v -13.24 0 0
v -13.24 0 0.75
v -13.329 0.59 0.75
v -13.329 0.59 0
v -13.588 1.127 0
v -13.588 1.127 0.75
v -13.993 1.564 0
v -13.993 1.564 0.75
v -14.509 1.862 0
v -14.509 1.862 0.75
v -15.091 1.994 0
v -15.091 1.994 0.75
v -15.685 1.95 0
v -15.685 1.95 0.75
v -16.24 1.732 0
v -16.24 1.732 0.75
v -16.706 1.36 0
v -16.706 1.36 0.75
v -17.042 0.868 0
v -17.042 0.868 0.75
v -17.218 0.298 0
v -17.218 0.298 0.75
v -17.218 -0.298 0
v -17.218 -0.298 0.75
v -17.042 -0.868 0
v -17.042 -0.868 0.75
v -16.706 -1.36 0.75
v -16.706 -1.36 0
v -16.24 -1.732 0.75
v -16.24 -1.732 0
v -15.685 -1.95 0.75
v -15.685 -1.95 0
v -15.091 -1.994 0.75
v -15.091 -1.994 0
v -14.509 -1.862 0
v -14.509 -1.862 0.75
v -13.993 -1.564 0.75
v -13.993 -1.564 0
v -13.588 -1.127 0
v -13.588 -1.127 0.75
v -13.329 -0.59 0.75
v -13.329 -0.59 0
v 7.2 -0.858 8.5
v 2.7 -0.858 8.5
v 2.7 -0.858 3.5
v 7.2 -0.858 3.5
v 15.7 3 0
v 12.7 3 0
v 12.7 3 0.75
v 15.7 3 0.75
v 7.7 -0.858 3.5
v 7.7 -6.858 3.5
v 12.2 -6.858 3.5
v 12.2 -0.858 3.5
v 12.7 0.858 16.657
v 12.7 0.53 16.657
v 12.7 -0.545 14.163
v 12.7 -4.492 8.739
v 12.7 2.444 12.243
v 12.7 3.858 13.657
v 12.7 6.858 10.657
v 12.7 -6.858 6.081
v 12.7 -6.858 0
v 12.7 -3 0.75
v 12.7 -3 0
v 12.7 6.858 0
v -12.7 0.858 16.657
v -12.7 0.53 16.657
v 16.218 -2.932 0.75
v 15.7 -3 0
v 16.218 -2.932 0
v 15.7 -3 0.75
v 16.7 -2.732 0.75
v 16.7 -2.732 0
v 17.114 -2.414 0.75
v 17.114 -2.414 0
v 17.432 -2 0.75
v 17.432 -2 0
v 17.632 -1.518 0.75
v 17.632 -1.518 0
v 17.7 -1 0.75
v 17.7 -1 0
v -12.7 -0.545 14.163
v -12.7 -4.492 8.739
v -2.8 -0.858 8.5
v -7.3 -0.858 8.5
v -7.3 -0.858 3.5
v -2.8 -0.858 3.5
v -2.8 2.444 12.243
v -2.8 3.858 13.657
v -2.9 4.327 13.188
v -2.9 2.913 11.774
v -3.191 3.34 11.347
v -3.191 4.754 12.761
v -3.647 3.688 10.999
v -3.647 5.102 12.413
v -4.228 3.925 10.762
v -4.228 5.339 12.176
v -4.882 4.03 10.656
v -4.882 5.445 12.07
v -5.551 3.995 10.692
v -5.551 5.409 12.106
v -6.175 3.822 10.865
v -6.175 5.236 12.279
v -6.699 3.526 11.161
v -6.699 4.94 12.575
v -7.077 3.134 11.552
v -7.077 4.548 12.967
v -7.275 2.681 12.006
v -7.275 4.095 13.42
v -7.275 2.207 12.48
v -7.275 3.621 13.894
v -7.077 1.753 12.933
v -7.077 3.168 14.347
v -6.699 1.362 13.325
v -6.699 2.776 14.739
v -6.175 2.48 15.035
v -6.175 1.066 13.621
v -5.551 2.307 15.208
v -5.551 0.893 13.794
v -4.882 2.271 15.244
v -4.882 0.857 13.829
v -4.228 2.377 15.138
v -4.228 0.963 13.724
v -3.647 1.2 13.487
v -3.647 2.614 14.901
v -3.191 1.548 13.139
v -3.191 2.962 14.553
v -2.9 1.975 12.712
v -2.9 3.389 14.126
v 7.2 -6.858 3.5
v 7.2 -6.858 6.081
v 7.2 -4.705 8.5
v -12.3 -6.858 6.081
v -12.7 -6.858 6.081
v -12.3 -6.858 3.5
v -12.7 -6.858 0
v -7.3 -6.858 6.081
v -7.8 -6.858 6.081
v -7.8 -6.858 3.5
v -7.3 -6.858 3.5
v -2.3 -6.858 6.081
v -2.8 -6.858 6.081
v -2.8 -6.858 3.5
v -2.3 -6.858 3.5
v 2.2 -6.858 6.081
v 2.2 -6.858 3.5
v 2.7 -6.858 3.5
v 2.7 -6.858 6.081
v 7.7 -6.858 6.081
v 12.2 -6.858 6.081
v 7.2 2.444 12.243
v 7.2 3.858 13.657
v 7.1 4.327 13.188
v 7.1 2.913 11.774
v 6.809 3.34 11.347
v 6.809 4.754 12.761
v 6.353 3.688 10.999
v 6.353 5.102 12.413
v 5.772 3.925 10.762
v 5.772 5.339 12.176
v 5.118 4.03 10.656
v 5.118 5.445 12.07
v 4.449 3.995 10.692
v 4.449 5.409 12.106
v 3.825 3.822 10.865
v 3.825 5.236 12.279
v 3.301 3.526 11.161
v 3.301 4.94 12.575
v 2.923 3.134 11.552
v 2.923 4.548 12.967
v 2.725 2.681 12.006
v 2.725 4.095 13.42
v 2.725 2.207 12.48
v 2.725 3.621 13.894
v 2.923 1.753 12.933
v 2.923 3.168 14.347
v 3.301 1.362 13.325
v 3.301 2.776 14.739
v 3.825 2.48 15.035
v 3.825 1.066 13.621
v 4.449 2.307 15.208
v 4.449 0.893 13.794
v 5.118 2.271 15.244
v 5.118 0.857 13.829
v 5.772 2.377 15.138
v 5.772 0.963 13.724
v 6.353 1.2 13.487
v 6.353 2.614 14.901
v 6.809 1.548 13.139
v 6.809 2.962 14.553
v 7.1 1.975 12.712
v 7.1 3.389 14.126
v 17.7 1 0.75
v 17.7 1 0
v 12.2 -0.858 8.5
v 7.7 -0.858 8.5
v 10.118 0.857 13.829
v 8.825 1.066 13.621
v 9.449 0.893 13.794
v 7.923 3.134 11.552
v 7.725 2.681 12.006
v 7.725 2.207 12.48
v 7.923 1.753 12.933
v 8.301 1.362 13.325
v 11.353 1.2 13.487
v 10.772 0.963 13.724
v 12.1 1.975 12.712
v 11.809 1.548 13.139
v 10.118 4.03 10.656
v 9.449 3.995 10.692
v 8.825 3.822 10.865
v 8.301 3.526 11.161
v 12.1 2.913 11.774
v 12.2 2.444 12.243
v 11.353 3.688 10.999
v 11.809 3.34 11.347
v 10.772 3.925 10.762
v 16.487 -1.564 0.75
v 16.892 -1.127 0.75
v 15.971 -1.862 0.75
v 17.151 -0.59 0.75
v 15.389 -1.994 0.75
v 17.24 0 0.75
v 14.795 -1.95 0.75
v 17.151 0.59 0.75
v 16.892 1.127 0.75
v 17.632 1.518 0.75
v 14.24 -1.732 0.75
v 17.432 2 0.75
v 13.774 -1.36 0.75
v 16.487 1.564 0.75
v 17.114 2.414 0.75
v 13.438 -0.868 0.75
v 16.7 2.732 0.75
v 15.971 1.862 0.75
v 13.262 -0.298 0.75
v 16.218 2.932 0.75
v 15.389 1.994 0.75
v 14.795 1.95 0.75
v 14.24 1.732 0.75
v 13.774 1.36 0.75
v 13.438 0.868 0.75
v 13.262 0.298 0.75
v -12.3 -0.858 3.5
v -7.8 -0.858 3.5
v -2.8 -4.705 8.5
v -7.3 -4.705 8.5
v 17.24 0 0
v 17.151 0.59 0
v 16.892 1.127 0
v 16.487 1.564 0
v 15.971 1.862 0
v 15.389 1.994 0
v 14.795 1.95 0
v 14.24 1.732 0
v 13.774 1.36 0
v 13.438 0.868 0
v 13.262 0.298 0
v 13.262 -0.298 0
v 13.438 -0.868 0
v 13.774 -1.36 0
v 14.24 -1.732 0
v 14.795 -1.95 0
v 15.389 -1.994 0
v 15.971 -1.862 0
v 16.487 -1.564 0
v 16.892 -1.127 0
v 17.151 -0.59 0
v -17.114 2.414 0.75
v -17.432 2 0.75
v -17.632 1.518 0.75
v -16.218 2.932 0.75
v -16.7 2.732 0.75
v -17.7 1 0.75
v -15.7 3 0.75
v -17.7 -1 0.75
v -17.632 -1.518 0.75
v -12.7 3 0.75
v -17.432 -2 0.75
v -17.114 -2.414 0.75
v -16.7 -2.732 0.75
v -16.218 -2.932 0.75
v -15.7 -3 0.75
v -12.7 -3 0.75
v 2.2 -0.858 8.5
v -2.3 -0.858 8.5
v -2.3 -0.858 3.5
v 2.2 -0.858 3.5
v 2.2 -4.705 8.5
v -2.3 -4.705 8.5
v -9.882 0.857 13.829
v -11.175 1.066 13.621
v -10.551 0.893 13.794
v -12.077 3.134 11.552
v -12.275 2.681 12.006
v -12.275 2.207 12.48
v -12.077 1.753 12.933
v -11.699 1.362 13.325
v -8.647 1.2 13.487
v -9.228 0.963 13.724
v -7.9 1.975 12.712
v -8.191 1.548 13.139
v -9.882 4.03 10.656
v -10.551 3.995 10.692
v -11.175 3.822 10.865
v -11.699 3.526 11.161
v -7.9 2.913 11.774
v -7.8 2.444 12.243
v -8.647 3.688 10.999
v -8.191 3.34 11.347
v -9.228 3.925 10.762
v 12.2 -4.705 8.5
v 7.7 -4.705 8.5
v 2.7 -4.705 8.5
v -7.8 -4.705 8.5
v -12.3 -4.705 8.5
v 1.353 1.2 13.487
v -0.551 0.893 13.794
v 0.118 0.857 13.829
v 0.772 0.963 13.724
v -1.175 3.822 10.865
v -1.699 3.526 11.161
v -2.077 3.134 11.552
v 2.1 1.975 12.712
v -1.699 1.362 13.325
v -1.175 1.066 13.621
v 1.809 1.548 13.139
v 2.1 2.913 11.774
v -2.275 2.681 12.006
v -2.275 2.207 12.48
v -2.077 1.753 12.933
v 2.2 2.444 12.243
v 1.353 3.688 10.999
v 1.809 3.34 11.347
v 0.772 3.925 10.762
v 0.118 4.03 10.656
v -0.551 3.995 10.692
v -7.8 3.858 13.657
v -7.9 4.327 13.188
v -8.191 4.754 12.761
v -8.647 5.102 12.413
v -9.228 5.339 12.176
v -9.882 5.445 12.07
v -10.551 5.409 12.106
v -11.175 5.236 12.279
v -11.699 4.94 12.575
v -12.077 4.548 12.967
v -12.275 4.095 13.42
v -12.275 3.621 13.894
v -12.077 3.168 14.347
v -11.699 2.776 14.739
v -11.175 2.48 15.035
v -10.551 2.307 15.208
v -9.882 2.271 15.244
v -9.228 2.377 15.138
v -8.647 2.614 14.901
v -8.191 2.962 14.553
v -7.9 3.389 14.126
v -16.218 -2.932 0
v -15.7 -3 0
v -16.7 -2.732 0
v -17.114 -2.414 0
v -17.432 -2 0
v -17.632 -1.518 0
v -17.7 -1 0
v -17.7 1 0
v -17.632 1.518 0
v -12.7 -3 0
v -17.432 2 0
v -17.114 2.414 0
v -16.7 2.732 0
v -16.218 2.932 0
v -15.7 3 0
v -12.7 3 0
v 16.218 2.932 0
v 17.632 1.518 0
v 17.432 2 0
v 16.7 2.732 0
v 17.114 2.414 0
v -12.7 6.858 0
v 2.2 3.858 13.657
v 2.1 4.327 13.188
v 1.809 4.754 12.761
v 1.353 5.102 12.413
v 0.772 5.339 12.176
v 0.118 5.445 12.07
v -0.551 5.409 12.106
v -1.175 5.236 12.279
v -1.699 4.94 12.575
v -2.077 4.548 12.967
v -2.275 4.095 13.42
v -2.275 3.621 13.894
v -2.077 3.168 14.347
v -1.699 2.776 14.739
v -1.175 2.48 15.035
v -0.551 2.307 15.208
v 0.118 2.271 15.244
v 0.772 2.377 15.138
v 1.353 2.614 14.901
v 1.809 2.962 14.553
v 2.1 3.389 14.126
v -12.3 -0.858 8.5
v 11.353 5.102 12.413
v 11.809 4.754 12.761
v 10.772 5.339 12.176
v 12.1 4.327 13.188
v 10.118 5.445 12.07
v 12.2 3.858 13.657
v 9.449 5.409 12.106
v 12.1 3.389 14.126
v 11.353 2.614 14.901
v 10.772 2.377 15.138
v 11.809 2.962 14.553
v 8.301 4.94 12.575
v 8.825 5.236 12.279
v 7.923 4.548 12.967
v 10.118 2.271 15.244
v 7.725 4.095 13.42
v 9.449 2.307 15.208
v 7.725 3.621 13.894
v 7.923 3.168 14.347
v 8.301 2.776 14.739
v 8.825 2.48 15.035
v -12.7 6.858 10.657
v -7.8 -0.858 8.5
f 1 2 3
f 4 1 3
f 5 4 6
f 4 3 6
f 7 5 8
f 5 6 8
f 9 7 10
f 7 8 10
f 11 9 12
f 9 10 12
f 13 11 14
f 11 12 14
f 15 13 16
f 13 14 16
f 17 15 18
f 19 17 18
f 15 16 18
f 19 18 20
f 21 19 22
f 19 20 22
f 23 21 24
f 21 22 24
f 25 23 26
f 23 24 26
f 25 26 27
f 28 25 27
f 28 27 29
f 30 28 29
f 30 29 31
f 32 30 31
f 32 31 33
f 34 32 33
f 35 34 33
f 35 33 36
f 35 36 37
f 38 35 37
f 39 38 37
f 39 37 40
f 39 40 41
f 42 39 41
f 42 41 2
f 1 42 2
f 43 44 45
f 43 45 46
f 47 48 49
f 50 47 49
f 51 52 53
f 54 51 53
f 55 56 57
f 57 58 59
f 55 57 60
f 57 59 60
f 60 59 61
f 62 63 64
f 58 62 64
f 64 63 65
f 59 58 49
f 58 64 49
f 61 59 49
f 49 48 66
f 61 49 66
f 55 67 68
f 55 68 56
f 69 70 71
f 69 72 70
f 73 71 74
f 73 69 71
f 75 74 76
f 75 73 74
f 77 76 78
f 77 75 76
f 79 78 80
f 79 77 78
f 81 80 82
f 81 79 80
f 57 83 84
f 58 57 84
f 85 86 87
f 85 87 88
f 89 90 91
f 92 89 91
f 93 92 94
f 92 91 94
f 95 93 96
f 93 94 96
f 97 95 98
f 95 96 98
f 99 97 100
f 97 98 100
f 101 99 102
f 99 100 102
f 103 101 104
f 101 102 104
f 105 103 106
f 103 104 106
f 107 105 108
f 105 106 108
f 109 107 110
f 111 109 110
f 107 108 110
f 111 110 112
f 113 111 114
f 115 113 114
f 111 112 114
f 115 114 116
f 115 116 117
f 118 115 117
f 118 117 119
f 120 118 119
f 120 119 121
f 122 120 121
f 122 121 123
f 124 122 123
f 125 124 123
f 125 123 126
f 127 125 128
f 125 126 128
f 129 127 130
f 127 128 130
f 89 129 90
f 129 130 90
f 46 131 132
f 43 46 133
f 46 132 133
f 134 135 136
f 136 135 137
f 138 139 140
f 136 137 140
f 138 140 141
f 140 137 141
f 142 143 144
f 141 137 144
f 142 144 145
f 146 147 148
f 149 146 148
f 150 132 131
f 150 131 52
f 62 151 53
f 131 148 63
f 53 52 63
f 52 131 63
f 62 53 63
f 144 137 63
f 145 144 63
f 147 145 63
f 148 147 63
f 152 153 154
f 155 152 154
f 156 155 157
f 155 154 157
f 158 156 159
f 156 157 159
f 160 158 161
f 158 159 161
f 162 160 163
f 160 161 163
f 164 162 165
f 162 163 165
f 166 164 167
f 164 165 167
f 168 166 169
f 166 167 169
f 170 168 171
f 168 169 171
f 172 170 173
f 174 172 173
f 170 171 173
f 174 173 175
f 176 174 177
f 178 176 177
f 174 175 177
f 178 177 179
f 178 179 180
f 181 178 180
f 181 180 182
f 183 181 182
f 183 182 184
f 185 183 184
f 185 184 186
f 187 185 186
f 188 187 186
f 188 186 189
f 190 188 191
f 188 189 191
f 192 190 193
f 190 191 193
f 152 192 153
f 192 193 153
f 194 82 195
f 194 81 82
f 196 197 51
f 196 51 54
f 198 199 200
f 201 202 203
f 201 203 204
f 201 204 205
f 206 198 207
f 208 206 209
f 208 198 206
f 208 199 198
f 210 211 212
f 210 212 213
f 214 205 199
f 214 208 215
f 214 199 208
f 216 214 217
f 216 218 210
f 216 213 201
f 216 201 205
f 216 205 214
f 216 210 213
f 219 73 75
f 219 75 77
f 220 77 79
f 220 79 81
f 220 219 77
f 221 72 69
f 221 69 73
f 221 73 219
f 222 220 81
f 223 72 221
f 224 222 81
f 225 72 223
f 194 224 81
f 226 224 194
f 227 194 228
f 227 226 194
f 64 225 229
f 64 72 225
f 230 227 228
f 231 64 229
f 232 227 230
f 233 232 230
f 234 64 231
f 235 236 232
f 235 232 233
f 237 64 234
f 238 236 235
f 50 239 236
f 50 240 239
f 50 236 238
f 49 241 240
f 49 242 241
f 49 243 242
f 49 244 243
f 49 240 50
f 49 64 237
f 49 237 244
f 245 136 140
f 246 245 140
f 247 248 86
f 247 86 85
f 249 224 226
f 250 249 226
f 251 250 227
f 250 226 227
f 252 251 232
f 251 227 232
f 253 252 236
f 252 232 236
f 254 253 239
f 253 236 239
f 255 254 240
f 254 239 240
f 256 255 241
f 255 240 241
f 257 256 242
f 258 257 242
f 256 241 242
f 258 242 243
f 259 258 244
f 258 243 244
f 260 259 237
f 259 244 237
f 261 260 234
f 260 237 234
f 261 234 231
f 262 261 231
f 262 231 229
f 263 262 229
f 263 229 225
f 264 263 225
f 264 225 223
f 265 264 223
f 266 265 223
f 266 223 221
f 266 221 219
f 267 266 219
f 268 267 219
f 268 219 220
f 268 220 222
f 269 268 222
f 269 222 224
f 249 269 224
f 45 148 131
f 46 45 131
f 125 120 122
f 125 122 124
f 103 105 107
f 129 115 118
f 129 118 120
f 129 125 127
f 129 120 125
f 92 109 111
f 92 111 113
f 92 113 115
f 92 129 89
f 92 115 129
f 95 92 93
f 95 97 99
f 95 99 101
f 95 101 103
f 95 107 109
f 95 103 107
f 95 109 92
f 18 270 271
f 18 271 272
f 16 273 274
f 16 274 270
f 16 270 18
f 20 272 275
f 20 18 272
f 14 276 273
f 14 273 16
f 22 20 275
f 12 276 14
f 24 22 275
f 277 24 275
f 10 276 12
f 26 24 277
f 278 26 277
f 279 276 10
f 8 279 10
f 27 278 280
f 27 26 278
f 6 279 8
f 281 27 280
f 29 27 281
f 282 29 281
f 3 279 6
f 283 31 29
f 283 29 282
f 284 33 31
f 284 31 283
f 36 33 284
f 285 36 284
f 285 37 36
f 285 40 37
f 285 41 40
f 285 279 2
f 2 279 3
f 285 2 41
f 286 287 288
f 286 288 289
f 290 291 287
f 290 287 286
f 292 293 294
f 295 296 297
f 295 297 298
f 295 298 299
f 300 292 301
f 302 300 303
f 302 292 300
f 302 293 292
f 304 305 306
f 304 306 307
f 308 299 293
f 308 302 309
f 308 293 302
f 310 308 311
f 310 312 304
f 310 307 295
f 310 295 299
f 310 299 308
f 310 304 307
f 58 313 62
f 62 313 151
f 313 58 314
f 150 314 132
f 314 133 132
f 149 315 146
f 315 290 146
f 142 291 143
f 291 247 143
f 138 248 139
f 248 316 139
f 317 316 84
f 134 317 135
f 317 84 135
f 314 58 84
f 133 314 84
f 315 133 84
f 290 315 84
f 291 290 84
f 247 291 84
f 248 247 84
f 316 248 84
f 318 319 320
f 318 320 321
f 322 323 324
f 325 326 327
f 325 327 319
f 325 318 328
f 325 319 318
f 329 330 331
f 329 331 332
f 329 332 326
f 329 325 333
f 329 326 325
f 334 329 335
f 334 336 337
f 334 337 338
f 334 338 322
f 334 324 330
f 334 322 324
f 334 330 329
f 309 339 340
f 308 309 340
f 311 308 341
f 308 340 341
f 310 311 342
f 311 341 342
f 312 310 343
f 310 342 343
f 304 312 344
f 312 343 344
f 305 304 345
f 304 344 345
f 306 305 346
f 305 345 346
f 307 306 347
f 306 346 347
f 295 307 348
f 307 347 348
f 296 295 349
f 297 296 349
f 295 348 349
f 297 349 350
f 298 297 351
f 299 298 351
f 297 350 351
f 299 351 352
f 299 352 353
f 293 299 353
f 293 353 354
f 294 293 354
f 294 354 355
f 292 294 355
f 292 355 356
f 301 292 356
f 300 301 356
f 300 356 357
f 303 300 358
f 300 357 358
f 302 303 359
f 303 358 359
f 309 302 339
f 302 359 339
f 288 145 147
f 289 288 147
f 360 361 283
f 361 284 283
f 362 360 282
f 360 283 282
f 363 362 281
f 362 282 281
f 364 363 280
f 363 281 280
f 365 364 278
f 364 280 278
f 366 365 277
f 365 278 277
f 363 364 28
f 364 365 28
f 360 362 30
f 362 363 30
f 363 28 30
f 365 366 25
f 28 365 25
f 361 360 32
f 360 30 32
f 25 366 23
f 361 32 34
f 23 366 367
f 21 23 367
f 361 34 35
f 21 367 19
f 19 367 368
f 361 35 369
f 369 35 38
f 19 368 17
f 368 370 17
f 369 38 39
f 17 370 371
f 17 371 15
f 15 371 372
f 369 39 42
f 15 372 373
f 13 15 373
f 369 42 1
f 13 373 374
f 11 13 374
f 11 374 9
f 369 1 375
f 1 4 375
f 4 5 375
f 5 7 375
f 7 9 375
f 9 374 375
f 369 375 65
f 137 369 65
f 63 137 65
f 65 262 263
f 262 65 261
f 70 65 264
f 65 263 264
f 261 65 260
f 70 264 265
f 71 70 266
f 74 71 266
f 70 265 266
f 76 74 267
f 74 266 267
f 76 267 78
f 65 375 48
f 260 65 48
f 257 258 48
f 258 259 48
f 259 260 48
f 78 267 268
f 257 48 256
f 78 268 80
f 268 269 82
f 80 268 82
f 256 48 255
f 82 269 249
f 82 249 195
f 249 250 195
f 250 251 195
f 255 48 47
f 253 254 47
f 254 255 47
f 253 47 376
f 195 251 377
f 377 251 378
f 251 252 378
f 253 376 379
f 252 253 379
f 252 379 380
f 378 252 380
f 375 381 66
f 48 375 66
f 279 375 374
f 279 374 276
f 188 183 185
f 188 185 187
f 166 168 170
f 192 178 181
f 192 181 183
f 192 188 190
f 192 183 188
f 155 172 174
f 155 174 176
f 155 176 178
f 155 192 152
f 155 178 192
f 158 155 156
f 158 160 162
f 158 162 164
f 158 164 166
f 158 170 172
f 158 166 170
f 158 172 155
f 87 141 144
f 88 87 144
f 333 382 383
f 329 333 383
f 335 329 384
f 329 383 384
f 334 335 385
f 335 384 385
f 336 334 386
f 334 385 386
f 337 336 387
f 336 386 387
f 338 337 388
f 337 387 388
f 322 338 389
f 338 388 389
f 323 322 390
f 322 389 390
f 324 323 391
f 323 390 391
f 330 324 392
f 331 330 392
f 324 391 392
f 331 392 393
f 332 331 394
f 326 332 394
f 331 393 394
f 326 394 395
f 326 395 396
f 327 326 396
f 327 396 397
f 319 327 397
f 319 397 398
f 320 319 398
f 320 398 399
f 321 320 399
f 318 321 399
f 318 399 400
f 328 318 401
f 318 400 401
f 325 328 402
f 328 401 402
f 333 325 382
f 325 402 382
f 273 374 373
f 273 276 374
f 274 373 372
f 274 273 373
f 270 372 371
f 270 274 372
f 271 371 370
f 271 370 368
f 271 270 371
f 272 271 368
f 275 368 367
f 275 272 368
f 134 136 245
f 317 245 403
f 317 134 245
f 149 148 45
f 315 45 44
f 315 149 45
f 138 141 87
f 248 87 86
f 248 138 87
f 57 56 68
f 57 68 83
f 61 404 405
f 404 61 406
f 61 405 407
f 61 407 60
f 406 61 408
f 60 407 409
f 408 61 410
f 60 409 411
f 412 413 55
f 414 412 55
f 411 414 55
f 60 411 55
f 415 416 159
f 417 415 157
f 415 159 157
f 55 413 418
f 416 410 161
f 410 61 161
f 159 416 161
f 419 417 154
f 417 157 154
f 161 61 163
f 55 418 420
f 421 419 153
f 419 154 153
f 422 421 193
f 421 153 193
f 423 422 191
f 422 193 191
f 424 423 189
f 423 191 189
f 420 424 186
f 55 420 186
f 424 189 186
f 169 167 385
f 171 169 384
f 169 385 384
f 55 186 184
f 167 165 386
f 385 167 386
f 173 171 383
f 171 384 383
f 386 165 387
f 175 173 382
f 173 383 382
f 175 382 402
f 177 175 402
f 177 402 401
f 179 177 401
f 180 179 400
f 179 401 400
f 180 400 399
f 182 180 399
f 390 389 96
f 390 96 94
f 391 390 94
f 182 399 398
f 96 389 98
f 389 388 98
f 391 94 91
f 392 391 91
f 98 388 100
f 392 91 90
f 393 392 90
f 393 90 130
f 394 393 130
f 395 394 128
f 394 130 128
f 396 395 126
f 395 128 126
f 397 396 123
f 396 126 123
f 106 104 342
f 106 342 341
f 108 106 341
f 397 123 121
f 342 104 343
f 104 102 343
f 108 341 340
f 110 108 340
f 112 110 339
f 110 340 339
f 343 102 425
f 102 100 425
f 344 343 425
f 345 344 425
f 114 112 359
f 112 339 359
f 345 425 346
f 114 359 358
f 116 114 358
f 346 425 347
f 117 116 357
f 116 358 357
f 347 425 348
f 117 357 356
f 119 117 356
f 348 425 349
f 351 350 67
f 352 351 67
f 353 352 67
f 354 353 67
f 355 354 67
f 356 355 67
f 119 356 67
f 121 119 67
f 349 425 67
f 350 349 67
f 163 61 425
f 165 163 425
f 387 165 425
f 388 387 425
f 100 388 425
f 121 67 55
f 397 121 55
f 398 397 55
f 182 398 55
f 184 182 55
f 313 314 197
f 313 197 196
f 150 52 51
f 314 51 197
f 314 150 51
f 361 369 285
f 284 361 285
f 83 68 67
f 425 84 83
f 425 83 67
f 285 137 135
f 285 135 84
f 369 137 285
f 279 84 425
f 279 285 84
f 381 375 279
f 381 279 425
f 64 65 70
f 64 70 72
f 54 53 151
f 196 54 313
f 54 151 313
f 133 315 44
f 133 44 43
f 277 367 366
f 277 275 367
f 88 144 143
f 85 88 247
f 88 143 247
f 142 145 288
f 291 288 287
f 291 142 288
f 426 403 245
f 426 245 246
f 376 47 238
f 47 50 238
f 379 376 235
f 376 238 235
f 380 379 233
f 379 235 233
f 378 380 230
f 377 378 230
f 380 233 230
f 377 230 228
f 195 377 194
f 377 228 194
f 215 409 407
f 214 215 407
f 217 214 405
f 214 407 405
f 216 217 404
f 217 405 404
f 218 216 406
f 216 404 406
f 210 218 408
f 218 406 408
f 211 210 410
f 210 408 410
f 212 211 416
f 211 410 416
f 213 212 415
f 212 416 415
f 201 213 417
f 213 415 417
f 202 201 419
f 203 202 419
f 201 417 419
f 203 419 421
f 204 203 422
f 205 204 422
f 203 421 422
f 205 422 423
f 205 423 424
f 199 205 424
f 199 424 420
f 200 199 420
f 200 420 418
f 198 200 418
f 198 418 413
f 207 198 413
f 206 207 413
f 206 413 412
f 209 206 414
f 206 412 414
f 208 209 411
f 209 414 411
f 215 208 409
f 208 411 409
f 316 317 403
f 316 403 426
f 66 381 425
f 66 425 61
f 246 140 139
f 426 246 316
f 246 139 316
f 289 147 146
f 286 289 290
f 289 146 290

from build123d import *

# Parameters (mm, degrees)
F0_W      = 25.4
F0_H      = 13.716
F1_DEPTH  = 16.657
F3_DEPTH  = 25.401
F5_W      = 4.5
F5_H      = 5
F4_R      = 2.25
F6_DEPTH  = 6
F7_R      = 2.25
F8_DEPTH  = 2
F9_W      = 6
F9_H      = 0.75
F10_DEPTH = 5
F11_W     = 6
F11_H     = 0.75
F12_DEPTH = 5
F13_R     = 2
F14_R     = 2
F15_DEPTH = 0.751
F16_R     = 2
F17_DEPTH = 0.751


with BuildPart() as f1:
    # F0 (on Top) → F1 (new body)
    with BuildSketch(Plane.XY):
        Rectangle(F0_W, F0_H)
    extrude(amount=F1_DEPTH)

    # F2 (on face) → F3 (cut, through all)
    with BuildSketch(Plane(origin=(-12.7, 0, 0), x_dir=(0, -1, 0), z_dir=(-1, 0, 0))):
        Polygon((-6.858, 10.657), (-0.858, 16.657), (-6.858, 16.657), align=None)
        Polygon((6.858, 16.657), (-0.5295271985, 16.657), (0.5445904681, 14.1634047031), (4.491972737, 8.7391110137), (6.858, 6.0806702822), align=None)
    extrude(amount=-F3_DEPTH, mode=Mode.SUBTRACT)

    # F5 (on face) + F4 (on face) → F6 (cut)
    with BuildSketch(Plane.XZ.offset(6.858)):
        with Locations((-10.05, 6)):
            Rectangle(F5_W, F5_H)
        with Locations((-5.05, 6)):
            Rectangle(F5_W, F5_H)
        with Locations((-0.05, 6)):
            Rectangle(F5_W, F5_H)
        with Locations((4.95, 6)):
            Rectangle(F5_W, F5_H)
        with Locations((9.95, 6)):
            Rectangle(F5_W, F5_H)
        with Locations((14.95, 6)):
            Rectangle(F5_W, F5_H)
        with Locations((19.95, 6)):
            Rectangle(F5_W, F5_H)
        with Locations((24.95, 6)):
            Rectangle(F5_W, F5_H)
        with Locations((29.95, 6)):
            Rectangle(F5_W, F5_H)
        with Locations((34.95, 6)):
            Rectangle(F5_W, F5_H)
        with Locations((39.95, 6)):
            Rectangle(F5_W, F5_H)
        with Locations((44.95, 6)):
            Rectangle(F5_W, F5_H)
    with BuildSketch(Plane(origin=(0, 6.858, 0), x_dir=(-1, 0, 0), z_dir=(0, 1, 0))):
        with Locations((9.72, 5.3285)):
            Circle(F4_R)
        with Locations((4.72, 5.3285)):
            Circle(F4_R)
        with Locations((-0.28, 5.3285)):
            Circle(F4_R)
        with Locations((-5.28, 5.3285)):
            Circle(F4_R)
        with Locations((-10.28, 5.3285)):
            Circle(F4_R)
        with Locations((-15.28, 5.3285)):
            Circle(F4_R)
        with Locations((-20.28, 5.3285)):
            Circle(F4_R)
        with Locations((-25.28, 5.3285)):
            Circle(F4_R)
        with Locations((-30.28, 5.3285)):
            Circle(F4_R)
        with Locations((-35.28, 5.3285)):
            Circle(F4_R)
        with Locations((-40.28, 5.3285)):
            Circle(F4_R)
        with Locations((-45.28, 5.3285)):
            Circle(F4_R)
    extrude(amount=-F6_DEPTH, dir=(0, -1, 0), mode=Mode.SUBTRACT)

    # F7 (on face) → F8 (cut)
    with BuildSketch(Plane(origin=(0, 8.7575, 8.7575), x_dir=(1, 0, 0), z_dir=(0, 0.7071067812, 0.7071067812))):
        with Locations((-10.05, -6.9289393488)):
            Circle(F7_R)
        with Locations((-5.05, -6.9289393488)):
            Circle(F7_R)
        with Locations((-0.05, -6.9289393488)):
            Circle(F7_R)
        with Locations((4.95, -6.9289393488)):
            Circle(F7_R)
        with Locations((9.95, -6.9289393488)):
            Circle(F7_R)
        with Locations((14.95, -6.9289393488)):
            Circle(F7_R)
        with Locations((19.95, -6.9289393488)):
            Circle(F7_R)
        with Locations((24.95, -6.9289393488)):
            Circle(F7_R)
        with Locations((29.95, -6.9289393488)):
            Circle(F7_R)
        with Locations((34.95, -6.9289393488)):
            Circle(F7_R)
        with Locations((39.95, -6.9289393488)):
            Circle(F7_R)
        with Locations((44.95, -6.9289393488)):
            Circle(F7_R)
    extrude(amount=-F8_DEPTH, mode=Mode.SUBTRACT)

    # F9 (on face) → F10 (join)
    with BuildSketch(Plane(origin=(-12.7, 0, 0), x_dir=(0, -1, 0), z_dir=(-1, 0, 0))):
        with Locations((0, 0.375)):
            Rectangle(F9_W, F9_H)
    extrude(amount=F10_DEPTH)

    # F11 (on face) → F12 (join)
    with BuildSketch(Plane.YZ.offset(12.7)):
        with Locations((0, 0.375)):
            Rectangle(F11_W, F11_H)
    extrude(amount=F12_DEPTH)

    # F13
    f13_edges = [f1.edges().sort_by_distance(p)[0] for p in [
        (-17.7, 3, 0.375),
        (-17.7, -3, 0.375),
        (17.7, -3, 0.375),
        (17.7, 3, 0.375),
    ]]
    fillet(f13_edges, radius=F13_R)

    # F14 (on face) → F15 (cut, through all)
    with BuildSketch(Plane.XY.offset(0.75)):
        with Locations((-15.24, 0)):
            Circle(F14_R)
    extrude(amount=-F15_DEPTH, mode=Mode.SUBTRACT)

    # F16 (on face) → F17 (cut, through all)
    with BuildSketch(Plane.XY.offset(0.75)):
        with Locations((15.24, 0)):
            Circle(F16_R)
    extrude(amount=-F17_DEPTH, mode=Mode.SUBTRACT)


solid = f1.part
